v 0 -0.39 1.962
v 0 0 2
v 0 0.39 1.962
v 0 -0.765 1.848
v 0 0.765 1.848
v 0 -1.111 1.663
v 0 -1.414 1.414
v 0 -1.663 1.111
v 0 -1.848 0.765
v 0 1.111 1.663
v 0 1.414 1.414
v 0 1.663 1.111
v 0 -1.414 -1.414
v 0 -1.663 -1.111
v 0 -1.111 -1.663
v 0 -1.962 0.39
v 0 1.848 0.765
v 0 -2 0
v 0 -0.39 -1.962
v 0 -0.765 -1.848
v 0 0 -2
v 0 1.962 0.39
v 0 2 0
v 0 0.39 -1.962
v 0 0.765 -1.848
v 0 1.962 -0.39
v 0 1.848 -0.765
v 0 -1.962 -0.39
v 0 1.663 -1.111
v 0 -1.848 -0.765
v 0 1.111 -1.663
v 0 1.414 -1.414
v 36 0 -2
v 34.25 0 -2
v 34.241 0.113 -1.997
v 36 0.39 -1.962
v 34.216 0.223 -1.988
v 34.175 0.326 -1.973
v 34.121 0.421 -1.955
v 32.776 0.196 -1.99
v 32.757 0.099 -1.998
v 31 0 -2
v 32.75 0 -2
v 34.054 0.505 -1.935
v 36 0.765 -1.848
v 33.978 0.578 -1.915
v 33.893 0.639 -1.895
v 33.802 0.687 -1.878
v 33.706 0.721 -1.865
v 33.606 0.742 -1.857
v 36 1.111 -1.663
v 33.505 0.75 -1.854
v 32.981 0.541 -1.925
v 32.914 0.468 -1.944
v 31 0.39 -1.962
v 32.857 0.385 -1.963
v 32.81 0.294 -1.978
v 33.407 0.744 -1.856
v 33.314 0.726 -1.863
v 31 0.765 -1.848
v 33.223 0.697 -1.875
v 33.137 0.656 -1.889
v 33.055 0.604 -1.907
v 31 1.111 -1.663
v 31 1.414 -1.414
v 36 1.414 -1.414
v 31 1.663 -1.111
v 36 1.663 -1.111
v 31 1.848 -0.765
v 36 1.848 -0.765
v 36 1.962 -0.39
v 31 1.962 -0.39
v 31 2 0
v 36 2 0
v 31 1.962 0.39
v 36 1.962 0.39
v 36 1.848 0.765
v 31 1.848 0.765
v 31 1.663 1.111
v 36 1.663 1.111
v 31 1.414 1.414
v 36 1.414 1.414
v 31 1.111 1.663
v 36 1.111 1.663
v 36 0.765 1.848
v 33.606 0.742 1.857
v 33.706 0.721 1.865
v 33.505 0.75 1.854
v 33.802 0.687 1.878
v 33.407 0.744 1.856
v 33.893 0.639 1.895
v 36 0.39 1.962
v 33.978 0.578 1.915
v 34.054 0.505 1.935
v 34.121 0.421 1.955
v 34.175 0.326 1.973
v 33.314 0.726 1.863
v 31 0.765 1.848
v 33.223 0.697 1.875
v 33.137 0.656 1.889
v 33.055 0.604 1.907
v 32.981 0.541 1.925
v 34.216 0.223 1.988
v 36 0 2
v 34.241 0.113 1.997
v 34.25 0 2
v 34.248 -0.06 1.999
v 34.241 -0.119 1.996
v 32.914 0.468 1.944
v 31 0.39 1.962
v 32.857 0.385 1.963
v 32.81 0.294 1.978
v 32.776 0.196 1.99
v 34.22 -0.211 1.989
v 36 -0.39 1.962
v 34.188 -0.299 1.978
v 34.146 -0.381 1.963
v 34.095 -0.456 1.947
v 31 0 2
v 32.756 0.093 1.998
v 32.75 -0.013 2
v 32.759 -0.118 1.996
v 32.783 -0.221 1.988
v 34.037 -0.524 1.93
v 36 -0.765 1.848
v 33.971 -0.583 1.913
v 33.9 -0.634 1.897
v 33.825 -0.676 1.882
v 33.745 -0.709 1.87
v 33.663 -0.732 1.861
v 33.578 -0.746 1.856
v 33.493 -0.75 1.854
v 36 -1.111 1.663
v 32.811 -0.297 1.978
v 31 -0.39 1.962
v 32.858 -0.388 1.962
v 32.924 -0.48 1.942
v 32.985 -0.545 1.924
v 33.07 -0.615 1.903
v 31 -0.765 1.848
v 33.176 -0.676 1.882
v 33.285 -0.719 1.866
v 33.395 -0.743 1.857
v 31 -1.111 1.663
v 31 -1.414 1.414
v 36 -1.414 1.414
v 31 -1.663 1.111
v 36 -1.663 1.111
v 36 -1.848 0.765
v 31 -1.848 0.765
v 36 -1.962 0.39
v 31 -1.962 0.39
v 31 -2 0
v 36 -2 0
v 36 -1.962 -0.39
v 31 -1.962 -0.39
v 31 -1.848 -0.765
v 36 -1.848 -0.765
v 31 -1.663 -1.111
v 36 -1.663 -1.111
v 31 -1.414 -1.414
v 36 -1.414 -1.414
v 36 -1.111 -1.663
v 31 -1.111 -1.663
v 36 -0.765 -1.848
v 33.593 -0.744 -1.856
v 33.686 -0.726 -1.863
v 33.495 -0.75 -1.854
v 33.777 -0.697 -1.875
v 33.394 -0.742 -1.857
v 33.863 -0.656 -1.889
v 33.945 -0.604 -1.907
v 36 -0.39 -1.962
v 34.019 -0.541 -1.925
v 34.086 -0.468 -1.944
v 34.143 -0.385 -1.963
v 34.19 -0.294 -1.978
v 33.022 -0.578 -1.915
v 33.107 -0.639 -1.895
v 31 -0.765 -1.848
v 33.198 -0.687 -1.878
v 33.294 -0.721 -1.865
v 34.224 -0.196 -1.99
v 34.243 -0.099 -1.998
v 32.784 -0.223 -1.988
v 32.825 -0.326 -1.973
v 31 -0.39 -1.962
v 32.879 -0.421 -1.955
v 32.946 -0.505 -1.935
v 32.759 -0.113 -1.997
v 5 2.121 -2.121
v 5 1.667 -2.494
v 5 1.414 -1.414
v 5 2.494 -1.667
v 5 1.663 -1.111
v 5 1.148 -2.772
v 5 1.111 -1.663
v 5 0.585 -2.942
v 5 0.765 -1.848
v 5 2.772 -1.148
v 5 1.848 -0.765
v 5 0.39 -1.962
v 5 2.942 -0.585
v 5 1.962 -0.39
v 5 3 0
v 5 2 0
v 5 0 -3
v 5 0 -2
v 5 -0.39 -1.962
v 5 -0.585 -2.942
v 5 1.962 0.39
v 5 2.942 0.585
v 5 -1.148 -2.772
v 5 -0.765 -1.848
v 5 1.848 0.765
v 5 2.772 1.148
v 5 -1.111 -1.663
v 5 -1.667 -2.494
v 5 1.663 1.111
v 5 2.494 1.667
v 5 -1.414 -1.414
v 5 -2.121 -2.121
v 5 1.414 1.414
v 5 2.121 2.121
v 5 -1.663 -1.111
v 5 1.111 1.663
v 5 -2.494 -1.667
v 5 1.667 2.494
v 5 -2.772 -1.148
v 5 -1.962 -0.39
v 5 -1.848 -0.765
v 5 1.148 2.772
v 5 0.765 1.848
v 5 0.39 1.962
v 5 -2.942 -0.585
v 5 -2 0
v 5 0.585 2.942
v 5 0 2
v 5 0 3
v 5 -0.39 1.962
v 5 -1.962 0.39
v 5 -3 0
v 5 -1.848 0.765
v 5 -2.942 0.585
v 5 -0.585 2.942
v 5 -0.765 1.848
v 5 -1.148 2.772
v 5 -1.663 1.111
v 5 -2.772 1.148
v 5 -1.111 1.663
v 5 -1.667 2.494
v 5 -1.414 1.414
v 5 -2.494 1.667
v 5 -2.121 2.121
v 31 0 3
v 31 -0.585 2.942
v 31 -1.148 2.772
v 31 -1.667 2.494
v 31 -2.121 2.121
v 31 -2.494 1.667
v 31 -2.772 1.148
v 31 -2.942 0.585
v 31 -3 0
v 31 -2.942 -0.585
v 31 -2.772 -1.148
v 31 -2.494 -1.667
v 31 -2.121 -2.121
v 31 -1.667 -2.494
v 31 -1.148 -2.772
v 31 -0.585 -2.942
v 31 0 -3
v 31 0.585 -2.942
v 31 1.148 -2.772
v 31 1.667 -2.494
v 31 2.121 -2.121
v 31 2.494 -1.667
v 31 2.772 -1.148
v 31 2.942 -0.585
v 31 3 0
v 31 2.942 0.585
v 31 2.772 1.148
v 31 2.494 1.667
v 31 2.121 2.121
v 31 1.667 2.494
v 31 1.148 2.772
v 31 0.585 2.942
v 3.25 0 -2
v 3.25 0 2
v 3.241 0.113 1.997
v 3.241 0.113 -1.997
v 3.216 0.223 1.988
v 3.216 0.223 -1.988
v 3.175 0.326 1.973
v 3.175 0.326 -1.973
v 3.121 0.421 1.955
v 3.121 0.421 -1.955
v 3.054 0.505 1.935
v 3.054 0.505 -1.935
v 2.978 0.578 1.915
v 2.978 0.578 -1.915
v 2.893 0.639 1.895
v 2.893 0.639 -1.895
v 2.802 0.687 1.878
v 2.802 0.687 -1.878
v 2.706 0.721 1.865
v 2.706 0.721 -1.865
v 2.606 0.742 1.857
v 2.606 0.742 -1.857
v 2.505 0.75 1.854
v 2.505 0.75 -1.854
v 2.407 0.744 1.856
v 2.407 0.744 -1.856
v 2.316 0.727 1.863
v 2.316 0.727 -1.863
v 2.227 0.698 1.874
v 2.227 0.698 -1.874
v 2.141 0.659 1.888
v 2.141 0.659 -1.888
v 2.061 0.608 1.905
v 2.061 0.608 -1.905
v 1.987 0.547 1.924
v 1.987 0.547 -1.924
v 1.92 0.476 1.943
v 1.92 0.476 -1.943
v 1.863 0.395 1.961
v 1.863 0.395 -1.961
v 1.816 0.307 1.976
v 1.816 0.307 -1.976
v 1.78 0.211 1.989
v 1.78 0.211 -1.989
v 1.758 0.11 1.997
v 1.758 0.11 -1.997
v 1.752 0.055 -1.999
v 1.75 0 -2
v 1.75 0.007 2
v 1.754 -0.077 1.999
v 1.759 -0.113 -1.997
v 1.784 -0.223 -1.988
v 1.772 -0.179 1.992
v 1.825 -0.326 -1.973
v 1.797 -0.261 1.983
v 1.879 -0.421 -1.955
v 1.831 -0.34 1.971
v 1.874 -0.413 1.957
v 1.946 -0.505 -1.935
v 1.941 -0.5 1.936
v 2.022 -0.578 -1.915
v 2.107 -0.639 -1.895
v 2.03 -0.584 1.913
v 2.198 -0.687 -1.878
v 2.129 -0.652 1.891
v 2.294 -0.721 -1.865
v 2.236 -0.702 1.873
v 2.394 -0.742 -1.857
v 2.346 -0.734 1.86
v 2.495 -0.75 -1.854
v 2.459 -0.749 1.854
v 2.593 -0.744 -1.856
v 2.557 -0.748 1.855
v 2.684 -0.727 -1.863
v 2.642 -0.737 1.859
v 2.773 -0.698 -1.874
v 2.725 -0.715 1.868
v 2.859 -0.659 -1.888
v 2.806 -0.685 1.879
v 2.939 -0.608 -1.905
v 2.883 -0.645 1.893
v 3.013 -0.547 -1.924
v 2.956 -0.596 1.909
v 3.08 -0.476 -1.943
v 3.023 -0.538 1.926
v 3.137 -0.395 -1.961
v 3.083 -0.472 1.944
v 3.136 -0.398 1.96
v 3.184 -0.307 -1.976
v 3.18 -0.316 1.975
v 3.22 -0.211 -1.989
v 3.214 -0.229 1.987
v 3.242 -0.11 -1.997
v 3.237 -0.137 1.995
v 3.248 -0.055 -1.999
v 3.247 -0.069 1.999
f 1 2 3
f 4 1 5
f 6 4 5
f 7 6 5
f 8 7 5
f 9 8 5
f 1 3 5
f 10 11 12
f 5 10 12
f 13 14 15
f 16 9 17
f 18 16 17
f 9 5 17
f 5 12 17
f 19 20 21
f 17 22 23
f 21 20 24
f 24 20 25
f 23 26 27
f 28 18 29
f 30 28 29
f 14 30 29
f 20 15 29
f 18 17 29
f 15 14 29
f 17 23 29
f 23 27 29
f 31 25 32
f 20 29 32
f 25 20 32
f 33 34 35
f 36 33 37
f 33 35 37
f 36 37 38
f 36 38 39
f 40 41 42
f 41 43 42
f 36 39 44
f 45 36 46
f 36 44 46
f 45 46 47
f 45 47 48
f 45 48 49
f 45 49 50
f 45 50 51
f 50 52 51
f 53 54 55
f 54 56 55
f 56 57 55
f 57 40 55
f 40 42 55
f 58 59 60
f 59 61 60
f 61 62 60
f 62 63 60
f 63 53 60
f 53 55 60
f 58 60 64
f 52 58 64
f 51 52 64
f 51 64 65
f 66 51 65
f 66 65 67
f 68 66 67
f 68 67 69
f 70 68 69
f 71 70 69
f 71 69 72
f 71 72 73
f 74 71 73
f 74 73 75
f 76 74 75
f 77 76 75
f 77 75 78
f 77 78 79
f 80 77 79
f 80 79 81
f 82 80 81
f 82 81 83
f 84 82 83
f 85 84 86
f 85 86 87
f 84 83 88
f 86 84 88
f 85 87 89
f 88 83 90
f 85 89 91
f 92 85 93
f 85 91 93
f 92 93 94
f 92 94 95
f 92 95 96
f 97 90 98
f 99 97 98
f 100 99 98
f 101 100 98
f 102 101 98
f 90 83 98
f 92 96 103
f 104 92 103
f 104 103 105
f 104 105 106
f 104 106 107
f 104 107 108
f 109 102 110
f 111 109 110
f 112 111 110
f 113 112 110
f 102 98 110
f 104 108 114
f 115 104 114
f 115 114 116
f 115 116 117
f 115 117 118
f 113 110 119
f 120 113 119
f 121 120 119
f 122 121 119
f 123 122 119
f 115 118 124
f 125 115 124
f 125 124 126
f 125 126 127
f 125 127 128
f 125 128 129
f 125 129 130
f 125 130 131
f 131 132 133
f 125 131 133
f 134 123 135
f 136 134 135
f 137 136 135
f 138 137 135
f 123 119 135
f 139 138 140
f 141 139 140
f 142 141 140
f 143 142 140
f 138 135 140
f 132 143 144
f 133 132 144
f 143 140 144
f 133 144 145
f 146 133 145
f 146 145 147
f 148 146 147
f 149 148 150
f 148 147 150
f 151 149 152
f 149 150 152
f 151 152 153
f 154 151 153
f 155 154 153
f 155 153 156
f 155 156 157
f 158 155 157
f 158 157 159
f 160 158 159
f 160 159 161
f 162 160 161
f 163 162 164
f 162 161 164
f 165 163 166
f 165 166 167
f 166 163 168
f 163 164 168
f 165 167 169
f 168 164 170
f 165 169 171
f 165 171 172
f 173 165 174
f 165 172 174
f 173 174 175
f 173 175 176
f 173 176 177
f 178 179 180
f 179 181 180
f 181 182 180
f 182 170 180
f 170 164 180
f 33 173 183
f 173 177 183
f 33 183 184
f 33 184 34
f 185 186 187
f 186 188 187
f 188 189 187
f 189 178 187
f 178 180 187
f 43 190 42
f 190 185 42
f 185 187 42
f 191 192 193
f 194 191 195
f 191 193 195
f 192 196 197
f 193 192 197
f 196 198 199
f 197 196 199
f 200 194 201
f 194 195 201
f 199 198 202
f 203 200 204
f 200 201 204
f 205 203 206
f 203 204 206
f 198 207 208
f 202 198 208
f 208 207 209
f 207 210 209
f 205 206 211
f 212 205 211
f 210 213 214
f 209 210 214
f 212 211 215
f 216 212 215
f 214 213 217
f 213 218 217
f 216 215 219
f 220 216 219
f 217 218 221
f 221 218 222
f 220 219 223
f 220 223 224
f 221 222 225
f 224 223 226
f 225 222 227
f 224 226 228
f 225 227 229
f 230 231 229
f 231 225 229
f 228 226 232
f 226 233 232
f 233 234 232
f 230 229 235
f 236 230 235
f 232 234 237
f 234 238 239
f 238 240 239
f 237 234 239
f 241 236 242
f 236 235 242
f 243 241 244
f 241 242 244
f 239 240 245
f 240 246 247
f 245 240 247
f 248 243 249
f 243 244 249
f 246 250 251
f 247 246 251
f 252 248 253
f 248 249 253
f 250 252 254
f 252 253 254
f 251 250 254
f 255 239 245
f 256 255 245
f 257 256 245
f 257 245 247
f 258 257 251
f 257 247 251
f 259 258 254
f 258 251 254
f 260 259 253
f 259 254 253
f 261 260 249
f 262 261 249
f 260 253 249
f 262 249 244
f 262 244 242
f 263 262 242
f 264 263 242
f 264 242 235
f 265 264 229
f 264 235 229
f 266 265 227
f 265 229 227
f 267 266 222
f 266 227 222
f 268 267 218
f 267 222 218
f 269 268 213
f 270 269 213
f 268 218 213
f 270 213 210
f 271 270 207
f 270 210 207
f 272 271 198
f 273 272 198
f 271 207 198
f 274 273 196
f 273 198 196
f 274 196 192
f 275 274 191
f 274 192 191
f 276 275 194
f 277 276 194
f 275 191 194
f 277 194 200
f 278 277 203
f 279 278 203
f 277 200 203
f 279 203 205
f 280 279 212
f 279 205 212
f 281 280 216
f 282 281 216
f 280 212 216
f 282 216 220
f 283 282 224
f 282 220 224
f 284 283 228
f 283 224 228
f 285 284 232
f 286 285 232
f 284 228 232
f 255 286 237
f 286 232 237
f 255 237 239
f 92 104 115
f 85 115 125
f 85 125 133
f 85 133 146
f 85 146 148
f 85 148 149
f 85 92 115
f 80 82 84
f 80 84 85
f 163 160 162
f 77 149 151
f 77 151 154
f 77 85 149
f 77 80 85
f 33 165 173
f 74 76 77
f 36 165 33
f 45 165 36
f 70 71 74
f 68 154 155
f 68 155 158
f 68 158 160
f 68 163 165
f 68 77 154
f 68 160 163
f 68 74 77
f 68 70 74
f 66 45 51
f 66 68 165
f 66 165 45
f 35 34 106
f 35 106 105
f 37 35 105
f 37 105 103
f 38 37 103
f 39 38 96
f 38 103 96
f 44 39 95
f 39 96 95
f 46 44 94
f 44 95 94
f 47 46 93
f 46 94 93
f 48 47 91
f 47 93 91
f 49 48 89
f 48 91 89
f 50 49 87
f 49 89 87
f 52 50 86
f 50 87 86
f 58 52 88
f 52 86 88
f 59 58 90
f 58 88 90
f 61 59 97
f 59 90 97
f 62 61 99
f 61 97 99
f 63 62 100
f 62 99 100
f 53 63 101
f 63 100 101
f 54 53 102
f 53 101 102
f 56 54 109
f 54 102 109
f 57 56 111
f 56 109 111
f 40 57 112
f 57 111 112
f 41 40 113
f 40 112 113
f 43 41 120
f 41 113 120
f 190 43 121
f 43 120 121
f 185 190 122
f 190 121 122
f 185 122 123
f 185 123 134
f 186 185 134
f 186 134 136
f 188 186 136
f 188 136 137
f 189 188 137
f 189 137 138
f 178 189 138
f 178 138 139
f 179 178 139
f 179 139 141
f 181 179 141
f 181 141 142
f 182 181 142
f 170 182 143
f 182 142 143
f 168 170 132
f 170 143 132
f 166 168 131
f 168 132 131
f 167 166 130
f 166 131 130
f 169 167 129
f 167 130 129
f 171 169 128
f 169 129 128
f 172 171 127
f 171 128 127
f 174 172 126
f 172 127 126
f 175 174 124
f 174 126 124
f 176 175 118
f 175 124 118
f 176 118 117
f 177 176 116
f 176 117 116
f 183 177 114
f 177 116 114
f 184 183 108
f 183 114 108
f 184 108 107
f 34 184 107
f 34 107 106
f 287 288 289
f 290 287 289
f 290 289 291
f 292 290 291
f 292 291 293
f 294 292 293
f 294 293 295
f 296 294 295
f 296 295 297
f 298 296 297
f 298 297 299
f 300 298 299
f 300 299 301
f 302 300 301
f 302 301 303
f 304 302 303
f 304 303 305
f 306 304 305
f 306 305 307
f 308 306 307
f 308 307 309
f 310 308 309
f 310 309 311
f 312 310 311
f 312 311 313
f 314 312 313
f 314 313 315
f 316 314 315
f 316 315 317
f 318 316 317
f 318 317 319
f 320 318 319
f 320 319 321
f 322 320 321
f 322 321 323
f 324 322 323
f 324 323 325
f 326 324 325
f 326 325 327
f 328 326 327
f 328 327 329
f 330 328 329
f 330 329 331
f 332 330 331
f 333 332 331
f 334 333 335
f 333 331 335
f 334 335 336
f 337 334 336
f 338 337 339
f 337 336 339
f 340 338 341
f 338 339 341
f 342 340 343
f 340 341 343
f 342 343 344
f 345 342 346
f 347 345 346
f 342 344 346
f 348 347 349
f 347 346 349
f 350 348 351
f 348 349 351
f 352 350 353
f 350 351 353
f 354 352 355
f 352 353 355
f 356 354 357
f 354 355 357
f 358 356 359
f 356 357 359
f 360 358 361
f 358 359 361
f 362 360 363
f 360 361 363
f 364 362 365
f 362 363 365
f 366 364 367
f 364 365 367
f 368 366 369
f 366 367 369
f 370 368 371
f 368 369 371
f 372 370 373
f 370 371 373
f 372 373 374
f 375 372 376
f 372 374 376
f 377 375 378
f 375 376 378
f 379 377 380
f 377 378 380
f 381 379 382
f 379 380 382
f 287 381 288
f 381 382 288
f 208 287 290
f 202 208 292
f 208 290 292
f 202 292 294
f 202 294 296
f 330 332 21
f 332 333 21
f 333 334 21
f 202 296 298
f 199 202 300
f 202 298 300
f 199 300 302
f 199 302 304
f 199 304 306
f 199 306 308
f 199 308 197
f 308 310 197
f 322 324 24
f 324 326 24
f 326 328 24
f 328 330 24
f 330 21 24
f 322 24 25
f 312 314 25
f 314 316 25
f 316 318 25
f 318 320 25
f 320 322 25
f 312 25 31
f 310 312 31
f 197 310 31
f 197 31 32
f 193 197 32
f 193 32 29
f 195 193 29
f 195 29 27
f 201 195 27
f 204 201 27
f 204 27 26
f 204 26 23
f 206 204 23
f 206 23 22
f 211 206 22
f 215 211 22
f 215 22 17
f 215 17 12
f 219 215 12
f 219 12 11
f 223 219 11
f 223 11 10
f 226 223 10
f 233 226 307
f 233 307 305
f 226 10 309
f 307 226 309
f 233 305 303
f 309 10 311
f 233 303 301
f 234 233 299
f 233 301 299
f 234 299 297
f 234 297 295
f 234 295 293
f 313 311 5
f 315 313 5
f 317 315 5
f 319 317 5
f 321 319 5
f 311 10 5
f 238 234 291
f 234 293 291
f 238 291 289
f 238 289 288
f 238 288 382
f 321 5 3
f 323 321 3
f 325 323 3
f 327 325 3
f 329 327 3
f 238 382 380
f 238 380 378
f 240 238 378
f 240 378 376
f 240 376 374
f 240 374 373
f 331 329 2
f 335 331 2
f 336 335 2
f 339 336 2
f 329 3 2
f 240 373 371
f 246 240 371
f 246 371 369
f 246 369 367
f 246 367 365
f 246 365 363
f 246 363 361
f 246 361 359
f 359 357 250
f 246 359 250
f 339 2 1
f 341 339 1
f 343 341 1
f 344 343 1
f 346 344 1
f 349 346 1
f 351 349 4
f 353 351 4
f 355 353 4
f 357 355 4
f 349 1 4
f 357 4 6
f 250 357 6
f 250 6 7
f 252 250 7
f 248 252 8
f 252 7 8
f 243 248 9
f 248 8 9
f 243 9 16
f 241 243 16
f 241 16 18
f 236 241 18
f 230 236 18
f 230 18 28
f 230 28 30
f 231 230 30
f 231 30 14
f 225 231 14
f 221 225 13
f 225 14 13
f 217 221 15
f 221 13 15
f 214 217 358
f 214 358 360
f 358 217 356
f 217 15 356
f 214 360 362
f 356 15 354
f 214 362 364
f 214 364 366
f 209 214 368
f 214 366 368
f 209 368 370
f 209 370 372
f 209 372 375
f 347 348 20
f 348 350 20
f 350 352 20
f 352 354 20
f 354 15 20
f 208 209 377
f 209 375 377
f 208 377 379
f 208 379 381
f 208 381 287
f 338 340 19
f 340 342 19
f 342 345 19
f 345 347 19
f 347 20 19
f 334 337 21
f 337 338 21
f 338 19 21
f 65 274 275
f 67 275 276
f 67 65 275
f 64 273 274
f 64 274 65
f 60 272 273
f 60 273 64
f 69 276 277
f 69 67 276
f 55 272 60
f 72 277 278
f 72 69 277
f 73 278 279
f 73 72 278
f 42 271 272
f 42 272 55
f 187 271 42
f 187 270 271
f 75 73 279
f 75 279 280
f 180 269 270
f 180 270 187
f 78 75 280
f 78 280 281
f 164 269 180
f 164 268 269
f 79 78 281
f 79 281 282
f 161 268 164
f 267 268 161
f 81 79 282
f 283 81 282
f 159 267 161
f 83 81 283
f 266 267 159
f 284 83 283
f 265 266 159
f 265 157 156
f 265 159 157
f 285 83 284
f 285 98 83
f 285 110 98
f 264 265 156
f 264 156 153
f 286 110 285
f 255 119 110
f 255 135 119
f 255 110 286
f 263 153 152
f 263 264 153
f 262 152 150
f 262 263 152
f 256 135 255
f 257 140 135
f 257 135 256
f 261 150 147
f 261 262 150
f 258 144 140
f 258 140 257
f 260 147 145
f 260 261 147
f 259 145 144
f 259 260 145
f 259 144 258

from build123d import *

# Parameters (mm, degrees)
SKETCH1_R           = 2
BOSS_EXTRUDE1_DEPTH = 5
SKETCH2_R           = 3
BOSS_EXTRUDE2_DEPTH = 26
SKETCH3_R           = 2
BOSS_EXTRUDE3_DEPTH = 5
SKETCH4_R           = 0.75
CUT_EXTRUDE1_DEPTH  = 2.5


with BuildPart() as part:
    # Sketch1 → Boss-Extrude1 (new body)
    with BuildSketch(Plane(origin=(0, 0, 0), x_dir=(0, 0, -1), z_dir=(1, 0, 0))):
        Circle(SKETCH1_R)
    extrude(amount=BOSS_EXTRUDE1_DEPTH)

    # Sketch2 → Boss-Extrude2 (add)
    with BuildSketch(Plane(origin=(5, 0, 0), x_dir=(0, 0, -1), z_dir=(1, 0, 0))):
        with Locations(Location((0, 0, 0), (0, 0, 180))):
            Circle(SKETCH2_R)
    extrude(amount=BOSS_EXTRUDE2_DEPTH)

    # Sketch3 → Boss-Extrude3 (add)
    with BuildSketch(Plane(origin=(31, 0, 0), x_dir=(0, 0, -1), z_dir=(1, 0, 0))):
        Circle(SKETCH3_R)
    extrude(amount=BOSS_EXTRUDE3_DEPTH)

    # Sketch4 → Cut-Extrude1 (cut, symmetric)
    with BuildSketch(Plane.XY):
        with Locations((33.5, 0)):
            Circle(SKETCH4_R)
        with Locations((2.5, 0)):
            Circle(SKETCH4_R)
    extrude(amount=CUT_EXTRUDE1_DEPTH, both=True, mode=Mode.SUBTRACT)


solid = part.part
